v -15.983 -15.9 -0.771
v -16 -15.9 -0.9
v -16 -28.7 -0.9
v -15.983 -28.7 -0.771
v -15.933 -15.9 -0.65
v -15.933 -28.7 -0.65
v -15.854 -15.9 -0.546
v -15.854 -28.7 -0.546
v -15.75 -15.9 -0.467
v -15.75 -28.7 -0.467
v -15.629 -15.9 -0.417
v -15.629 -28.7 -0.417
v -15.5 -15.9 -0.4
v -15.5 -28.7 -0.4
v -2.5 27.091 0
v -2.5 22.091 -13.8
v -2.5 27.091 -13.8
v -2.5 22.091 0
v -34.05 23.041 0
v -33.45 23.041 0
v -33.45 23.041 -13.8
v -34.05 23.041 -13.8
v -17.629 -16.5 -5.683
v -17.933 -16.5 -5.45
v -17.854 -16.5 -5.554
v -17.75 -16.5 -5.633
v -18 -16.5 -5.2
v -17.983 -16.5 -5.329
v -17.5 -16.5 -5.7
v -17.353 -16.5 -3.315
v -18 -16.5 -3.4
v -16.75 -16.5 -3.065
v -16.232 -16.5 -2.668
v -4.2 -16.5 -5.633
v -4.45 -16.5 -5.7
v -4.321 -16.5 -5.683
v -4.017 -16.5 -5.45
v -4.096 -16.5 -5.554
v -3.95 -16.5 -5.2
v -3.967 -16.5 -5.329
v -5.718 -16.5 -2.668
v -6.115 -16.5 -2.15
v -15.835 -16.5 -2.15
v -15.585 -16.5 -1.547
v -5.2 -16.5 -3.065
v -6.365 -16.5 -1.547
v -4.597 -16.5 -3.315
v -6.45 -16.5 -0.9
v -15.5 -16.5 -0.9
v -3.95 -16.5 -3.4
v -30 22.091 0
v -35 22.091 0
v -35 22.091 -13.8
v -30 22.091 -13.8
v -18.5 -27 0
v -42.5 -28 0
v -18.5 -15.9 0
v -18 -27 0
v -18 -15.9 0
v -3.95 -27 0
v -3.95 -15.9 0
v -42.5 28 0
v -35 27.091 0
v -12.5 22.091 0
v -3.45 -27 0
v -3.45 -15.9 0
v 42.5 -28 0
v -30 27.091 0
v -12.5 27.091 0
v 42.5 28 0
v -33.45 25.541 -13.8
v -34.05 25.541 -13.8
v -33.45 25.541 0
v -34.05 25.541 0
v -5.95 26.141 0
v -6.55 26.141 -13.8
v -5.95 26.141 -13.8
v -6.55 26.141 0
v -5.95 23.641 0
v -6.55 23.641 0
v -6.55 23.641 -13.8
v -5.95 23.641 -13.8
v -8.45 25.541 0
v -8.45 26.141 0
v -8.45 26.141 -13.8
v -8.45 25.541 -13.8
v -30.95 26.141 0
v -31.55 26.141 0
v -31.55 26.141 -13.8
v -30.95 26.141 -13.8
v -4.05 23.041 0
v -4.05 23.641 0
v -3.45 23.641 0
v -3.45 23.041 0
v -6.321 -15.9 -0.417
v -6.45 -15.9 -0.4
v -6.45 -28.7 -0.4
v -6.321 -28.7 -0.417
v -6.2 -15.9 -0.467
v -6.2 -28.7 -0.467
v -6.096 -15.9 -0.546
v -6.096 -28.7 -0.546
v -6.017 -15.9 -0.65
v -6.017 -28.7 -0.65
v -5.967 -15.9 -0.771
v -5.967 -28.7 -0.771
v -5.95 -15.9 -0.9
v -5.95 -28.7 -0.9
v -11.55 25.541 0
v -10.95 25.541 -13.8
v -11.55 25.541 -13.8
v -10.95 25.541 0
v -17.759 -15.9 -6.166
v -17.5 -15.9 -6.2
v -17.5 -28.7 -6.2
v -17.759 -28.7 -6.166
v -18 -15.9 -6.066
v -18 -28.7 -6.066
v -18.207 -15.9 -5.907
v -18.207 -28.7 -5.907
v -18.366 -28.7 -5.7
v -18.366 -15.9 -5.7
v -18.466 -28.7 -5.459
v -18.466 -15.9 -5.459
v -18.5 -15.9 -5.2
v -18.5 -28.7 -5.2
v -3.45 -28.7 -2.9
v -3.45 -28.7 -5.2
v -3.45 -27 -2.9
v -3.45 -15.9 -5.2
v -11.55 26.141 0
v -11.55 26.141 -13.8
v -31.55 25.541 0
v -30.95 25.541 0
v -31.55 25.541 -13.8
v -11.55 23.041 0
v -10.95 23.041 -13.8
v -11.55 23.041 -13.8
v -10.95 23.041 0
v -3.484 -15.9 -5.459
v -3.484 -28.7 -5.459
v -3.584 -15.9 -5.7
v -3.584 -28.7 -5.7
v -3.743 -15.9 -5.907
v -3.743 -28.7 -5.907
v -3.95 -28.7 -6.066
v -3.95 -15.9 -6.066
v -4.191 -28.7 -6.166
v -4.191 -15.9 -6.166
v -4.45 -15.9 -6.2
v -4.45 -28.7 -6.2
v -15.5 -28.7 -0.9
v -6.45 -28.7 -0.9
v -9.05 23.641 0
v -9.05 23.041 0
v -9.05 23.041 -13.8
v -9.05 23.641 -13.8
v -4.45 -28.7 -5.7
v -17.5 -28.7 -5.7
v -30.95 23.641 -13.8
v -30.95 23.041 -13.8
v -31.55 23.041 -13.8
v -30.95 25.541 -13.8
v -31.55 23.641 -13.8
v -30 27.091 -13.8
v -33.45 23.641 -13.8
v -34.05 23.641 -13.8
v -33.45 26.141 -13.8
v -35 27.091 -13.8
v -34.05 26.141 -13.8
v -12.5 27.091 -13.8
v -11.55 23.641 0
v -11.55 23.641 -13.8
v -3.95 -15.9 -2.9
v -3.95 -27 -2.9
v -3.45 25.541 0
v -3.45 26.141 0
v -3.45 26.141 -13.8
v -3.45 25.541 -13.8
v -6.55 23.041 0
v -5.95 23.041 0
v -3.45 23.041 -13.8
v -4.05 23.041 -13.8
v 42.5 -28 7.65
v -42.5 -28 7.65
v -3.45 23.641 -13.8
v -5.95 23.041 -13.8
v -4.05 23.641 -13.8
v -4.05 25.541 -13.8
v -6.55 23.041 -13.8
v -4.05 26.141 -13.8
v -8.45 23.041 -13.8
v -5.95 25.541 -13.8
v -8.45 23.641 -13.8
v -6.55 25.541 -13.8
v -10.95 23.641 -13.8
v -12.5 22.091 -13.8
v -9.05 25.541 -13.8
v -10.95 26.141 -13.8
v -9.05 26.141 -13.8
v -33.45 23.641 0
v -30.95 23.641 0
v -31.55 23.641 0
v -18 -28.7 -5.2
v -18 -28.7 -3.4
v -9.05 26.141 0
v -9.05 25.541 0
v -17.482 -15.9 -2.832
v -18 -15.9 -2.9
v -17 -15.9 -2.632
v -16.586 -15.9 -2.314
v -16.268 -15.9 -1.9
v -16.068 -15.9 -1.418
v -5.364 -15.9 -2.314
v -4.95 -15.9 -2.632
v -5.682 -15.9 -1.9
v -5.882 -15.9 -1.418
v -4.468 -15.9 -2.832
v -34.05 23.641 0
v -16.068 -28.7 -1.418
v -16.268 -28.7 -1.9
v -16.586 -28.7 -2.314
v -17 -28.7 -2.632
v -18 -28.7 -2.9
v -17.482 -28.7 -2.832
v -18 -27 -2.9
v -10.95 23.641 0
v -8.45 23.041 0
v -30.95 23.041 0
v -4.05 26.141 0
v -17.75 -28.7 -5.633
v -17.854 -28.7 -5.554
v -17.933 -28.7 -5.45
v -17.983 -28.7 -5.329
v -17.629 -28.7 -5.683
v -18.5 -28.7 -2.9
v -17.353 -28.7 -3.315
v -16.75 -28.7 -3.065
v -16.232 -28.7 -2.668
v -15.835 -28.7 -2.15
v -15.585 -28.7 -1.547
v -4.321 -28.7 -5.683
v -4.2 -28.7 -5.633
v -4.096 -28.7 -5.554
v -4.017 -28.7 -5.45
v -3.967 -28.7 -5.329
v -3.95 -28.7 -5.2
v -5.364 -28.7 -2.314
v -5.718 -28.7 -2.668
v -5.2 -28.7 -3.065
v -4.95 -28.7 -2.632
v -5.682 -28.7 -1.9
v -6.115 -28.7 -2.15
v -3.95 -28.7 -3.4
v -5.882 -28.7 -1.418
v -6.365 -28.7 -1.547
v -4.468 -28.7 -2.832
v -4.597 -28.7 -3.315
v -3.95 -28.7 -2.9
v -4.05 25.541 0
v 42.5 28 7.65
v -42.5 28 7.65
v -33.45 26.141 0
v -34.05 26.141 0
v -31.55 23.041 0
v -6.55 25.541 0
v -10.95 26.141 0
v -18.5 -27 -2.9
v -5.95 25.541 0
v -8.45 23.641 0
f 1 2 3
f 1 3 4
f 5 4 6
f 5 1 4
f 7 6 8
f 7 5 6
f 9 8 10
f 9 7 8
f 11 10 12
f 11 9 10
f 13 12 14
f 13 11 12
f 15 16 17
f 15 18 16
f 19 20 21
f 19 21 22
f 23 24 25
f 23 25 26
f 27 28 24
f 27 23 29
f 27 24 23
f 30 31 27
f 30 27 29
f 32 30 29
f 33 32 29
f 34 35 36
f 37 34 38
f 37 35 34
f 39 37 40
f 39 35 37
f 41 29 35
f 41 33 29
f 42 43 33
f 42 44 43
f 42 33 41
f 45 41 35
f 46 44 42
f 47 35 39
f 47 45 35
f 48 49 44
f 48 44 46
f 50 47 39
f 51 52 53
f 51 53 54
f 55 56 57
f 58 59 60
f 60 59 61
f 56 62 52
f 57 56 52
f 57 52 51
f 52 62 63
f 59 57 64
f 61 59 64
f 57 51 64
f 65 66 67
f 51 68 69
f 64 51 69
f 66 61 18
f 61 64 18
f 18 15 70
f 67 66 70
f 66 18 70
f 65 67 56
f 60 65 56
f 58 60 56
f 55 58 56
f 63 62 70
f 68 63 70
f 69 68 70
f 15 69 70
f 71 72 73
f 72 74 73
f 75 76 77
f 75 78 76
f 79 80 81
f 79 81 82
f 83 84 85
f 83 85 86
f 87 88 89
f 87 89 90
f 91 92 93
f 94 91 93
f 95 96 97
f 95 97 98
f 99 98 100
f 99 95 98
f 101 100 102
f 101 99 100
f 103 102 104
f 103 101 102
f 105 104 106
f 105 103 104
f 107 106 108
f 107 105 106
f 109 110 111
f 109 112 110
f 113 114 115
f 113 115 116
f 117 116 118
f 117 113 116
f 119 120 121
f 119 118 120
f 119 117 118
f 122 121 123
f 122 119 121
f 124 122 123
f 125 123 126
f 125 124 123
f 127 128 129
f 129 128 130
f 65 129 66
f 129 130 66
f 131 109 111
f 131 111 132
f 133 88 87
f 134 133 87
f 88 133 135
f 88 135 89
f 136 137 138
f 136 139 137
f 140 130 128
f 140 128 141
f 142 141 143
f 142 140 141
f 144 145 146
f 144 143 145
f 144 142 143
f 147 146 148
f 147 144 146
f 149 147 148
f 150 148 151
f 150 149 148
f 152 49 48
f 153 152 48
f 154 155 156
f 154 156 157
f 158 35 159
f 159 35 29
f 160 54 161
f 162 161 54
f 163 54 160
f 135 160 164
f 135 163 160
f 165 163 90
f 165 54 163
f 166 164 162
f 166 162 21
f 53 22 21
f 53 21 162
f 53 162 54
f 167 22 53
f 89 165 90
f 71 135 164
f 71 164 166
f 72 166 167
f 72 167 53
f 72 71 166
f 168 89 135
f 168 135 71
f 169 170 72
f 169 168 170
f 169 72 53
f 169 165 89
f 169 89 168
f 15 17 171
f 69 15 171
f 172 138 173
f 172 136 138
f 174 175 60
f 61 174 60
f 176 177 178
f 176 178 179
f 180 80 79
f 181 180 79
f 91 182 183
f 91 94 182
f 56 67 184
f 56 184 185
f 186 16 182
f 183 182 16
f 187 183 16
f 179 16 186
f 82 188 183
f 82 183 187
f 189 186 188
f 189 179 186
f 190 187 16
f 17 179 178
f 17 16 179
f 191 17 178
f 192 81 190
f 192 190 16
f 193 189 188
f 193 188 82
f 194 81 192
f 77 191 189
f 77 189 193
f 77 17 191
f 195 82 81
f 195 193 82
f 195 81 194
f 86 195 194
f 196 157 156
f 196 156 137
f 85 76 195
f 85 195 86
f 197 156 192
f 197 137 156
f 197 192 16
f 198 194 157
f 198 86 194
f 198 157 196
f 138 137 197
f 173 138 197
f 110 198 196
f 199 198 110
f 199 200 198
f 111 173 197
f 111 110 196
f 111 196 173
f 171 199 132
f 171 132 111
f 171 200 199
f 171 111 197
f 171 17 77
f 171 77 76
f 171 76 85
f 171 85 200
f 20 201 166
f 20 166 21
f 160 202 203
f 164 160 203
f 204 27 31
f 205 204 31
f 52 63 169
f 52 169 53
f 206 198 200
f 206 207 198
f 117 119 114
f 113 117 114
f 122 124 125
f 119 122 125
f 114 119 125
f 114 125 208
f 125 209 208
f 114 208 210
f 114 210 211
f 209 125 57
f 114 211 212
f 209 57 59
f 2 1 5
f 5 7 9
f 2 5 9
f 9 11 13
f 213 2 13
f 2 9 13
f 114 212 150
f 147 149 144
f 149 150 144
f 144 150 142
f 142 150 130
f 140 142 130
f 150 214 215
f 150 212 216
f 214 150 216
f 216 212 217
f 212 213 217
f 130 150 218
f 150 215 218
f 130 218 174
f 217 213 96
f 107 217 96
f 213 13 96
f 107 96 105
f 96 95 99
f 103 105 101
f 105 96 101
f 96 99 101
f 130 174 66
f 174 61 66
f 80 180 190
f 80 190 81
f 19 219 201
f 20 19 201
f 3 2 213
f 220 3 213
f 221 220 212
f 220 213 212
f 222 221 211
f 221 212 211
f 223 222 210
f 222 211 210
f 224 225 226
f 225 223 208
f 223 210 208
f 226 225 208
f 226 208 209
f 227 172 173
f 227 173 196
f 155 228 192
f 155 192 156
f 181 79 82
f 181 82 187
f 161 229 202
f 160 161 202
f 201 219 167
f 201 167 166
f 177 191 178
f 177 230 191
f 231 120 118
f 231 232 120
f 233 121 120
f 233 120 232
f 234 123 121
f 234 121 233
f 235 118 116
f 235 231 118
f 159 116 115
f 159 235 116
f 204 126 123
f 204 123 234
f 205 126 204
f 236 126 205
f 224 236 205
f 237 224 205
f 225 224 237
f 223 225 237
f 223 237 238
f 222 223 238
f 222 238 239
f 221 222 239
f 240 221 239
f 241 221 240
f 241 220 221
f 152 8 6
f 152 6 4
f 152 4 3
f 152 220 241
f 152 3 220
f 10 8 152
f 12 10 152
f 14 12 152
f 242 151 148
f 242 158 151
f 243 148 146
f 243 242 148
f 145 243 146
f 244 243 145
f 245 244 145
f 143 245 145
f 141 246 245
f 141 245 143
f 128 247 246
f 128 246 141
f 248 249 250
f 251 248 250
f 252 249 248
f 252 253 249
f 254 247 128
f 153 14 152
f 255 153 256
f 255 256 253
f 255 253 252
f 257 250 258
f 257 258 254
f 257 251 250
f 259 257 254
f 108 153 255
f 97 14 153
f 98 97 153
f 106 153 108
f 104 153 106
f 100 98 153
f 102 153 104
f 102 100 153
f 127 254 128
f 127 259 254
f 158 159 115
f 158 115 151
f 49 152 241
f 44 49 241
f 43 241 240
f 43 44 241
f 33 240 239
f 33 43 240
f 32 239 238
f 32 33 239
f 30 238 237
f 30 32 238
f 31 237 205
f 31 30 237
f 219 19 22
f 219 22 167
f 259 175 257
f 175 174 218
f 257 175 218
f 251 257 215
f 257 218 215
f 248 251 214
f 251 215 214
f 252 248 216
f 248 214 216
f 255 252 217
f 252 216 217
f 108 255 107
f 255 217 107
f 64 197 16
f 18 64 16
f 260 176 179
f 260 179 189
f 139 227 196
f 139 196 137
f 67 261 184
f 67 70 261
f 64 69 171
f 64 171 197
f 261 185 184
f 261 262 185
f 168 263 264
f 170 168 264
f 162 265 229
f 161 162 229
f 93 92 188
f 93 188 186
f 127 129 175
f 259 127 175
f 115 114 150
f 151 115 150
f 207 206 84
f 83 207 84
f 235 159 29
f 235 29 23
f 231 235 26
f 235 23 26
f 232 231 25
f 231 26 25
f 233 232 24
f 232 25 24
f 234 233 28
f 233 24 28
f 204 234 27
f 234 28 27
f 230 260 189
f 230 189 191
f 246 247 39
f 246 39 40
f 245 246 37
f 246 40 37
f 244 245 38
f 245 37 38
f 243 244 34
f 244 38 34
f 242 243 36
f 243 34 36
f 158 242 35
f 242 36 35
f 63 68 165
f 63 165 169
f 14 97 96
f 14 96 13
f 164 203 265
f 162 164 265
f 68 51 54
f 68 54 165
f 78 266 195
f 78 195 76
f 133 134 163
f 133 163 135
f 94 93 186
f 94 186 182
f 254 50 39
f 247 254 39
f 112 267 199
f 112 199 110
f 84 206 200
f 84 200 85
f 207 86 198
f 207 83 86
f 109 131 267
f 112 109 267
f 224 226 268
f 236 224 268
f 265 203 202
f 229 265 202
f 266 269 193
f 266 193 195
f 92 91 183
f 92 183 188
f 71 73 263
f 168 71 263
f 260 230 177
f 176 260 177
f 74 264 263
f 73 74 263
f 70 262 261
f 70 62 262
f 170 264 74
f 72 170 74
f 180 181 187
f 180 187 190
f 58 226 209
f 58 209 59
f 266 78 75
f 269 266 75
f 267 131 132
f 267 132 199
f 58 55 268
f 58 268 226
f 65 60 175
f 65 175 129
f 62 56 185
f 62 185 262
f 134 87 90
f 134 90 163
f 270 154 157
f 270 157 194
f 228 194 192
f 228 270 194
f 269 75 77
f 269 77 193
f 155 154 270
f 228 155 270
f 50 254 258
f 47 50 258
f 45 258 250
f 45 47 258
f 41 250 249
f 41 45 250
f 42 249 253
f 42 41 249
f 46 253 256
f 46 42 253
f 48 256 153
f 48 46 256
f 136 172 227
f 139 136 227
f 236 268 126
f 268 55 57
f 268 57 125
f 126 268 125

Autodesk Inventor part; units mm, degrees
ref_plane "YZ Plane" through (0, 0, 0) normal (1, 0, 0) x (0, 1, 0)
ref_plane "XZ Plane" through (0, 0, 0) normal (0, 1, 0) x (-1, 0, 0)
ref_plane "XY Plane" through (0, 0, 0) normal (0, 0, 1) x (1, 0, 0)
sketch "스케치2" plane through (0, 0, 0) normal (0, 0, 1) x (1, 0, 0)
  line L0 (-42.5, 28) -> (42.5, 28)
  line L1 (42.5, 28) -> (42.5, -28)
  line L2 (42.5, -28) -> (-42.5, -28)
  line L3 (-42.5, -28) -> (-42.5, 28)
  line L4 (-42.5, 28) -> (42.5, -28) construction
  line L5 (42.5, 28) -> (-42.5, -28) construction
  point P0 (0, 0)
  dimension "d6" = 85
  dimension "d7" = 56
extrude "돌출2" add sketch "스케치2" along normal blind 7.65
sketch "스케치4" plane through (0, 0, 0) normal (0, 0, -1) x (-1, 0, 0)
  line L0 (30, 27.091) -> (35, 27.091)
  line L1 (35, 27.091) -> (35, 22.091)
  line L2 (35, 22.091) -> (30, 22.091)
  line L3 (30, 22.091) -> (30, 27.091)
  line L4 (30, 27.091) -> (35, 22.091) construction
  line L5 (35, 27.091) -> (30, 22.091) construction
  line L6 (-42.5, 28) -> (42.5, 28) projected
  line L7 (-42.5, -28) -> (-42.5, 28) projected
  line L8 (30.95, 25.541) -> (31.55, 25.541)
  line L9 (31.55, 25.541) -> (31.55, 26.141)
  line L10 (31.55, 26.141) -> (30.95, 26.141)
  line L11 (30.95, 26.141) -> (30.95, 25.541)
  line L12 (30.95, 25.541) -> (31.55, 26.141) construction
  line L13 (31.55, 25.541) -> (30.95, 26.141) construction
  line L14 (32.5, 24.591) -> (32.5, 25.0687)
  line L15 (32.5, 24.591) -> (32.0223, 24.591)
  line L16 (34.05, 25.541) -> (33.45, 25.541)
  line L17 (33.45, 25.541) -> (33.45, 26.141)
  line L18 (33.45, 26.141) -> (34.05, 26.141)
  line L19 (34.05, 26.141) -> (34.05, 25.541)
  line L20 (34.05, 25.541) -> (33.45, 26.141) construction
  line L21 (33.45, 25.541) -> (34.05, 26.141) construction
  line L22 (30.95, 23.641) -> (31.55, 23.641)
  line L23 (31.55, 23.641) -> (31.55, 23.041)
  line L24 (31.55, 23.041) -> (30.95, 23.041)
  line L25 (30.95, 23.041) -> (30.95, 23.641)
  line L26 (30.95, 23.641) -> (31.55, 23.041) construction
  line L27 (31.55, 23.641) -> (30.95, 23.041) construction
  line L28 (34.05, 23.641) -> (33.45, 23.641)
  line L29 (33.45, 23.641) -> (33.45, 23.041)
  line L30 (33.45, 23.041) -> (34.05, 23.041)
  line L31 (34.05, 23.041) -> (34.05, 23.641)
  line L32 (34.05, 23.641) -> (33.45, 23.041) construction
  line L33 (33.45, 23.641) -> (34.05, 23.041) construction
  line L34 (42.5, 28) -> (42.5, -28) projected
  line L35 (12.5, 22.091) -> (2.5, 22.091)
  line L36 (2.5, 22.091) -> (2.5, 27.091)
  line L37 (2.5, 27.091) -> (12.5, 27.091)
  line L38 (12.5, 27.091) -> (12.5, 22.091)
  line L39 (12.5, 22.091) -> (2.5, 27.091) construction
  line L40 (2.5, 22.091) -> (12.5, 27.091) construction
  line L41 (11.55, 23.641) -> (10.95, 23.641)
  line L42 (10.95, 23.641) -> (10.95, 23.041)
  line L43 (10.95, 23.041) -> (11.55, 23.041)
  line L44 (11.55, 23.041) -> (11.55, 23.641)
  line L45 (11.55, 23.641) -> (10.95, 23.041) construction
  line L46 (10.95, 23.641) -> (11.55, 23.041) construction
  line L47 (11.55, 25.541) -> (11.55, 26.141)
  line L48 (10.95, 26.141) -> (10.95, 25.541)
  line L49 (10.95, 25.541) -> (11.55, 25.541)
  line L50 (11.55, 26.141) -> (10.95, 26.141)
  line L51 (11.55, 26.141) -> (10.95, 25.541) construction
  line L52 (10.95, 26.141) -> (11.55, 25.541) construction
  line L53 (9.05, 23.041) -> (9.05, 23.641)
  line L54 (8.45, 23.641) -> (8.45, 23.041)
  line L55 (8.45, 23.041) -> (9.05, 23.041)
  line L56 (9.05, 23.641) -> (8.45, 23.641)
  line L57 (9.05, 23.641) -> (8.45, 23.041) construction
  line L58 (8.45, 23.641) -> (9.05, 23.041) construction
  line L59 (9.05, 25.541) -> (9.05, 26.141)
  line L60 (8.45, 26.141) -> (8.45, 25.541)
  line L61 (8.45, 25.541) -> (9.05, 25.541)
  line L62 (9.05, 26.141) -> (8.45, 26.141)
  line L63 (9.05, 26.141) -> (8.45, 25.541) construction
  line L64 (8.45, 26.141) -> (9.05, 25.541) construction
  line L65 (6.55, 23.041) -> (6.55, 23.641)
  line L66 (5.95, 23.641) -> (5.95, 23.041)
  line L67 (5.95, 23.041) -> (6.55, 23.041)
  line L68 (6.55, 23.641) -> (5.95, 23.641)
  line L69 (6.55, 23.641) -> (5.95, 23.041) construction
  line L70 (5.95, 23.641) -> (6.55, 23.041) construction
  line L71 (6.55, 25.541) -> (6.55, 26.141)
  line L72 (5.95, 26.141) -> (5.95, 25.541)
  line L73 (5.95, 25.541) -> (6.55, 25.541)
  line L74 (6.55, 26.141) -> (5.95, 26.141)
  line L75 (6.55, 26.141) -> (5.95, 25.541) construction
  line L76 (5.95, 26.141) -> (6.55, 25.541) construction
  line L77 (4.05, 23.041) -> (4.05, 23.641)
  line L78 (3.45, 23.641) -> (3.45, 23.041)
  line L79 (3.45, 23.041) -> (4.05, 23.041)
  line L80 (4.05, 23.641) -> (3.45, 23.641)
  line L81 (4.05, 23.641) -> (3.45, 23.041) construction
  line L82 (3.45, 23.641) -> (4.05, 23.041) construction
  line L83 (4.05, 25.541) -> (4.05, 26.141)
  line L84 (3.45, 26.141) -> (3.45, 25.541)
  line L85 (3.45, 25.541) -> (4.05, 25.541)
  line L86 (4.05, 26.141) -> (3.45, 26.141)
  line L87 (4.05, 26.141) -> (3.45, 25.541) construction
  line L88 (3.45, 26.141) -> (4.05, 25.541) construction
  point P0 (0, 0)
  point P1 (31.25, 25.841)
  point P2 (33.75, 25.841)
  point P3 (31.25, 23.341)
  point P4 (33.75, 23.341)
  point P5 (7.5, 24.591)
  point P6 (11.25, 23.341)
  point P7 (11.25, 25.841)
  point P8 (8.75, 23.341)
  point P9 (8.75, 25.841)
  point P10 (6.25, 23.341)
  point P11 (6.25, 25.841)
  point P12 (3.75, 23.341)
  point P13 (3.75, 25.841)
  dimension "d12" = 5
  dimension "d13" = 5
  dimension "d14" = 0.6
  dimension "d15" = 0.6
  dimension "d18" = 1.25
  dimension "d19" = 7.5
  dimension "d20" = 0.909
  dimension "d21" = 5
  dimension "d22" = 10
  dimension "d23" = 17.5
  dimension "d24" = 0.909
  dimension "d25" = 0.6
  dimension "d26" = 0.6
  dimension "d27" = 1.25
  dimension "d28" = 1.25
  dimension "d31" = 2.5
  dimension "d34" = 2.5
extrude "돌출3" add sketch "스케치4" along normal blind 13.8
sketch "스케치5" plane through (-42.5, -28, 0) normal (0, -1, 0) x (1, 0, 0)
  line L0 (85, 0) -> (0, 0) projected
  line L1 (24, 0) -> (39.15, 0)
  line L2 (39.15, 0) -> (39.15, -6.2)
  line L3 (39.15, -6.2) -> (24, -6.2)
  line L4 (24, -6.2) -> (24, 0)
  line L5 (0, 0) -> (0, 7.65) projected
  line L6 (24, -2.9) -> (24.5, -2.9)
  line L7 (26.5, -0.9) -> (26.5, -0.9)
  line L8 (27, -0.4) -> (36.05, -0.4)
  line L9 (36.55, 0) -> (36.55, -13.8) construction
  line L10 (36.55, -0.9) -> (36.55, -0.9)
  line L11 (38.55, -2.9) -> (39.05, -2.9)
  line L12 (39.05, 0) -> (39.05, -13.8) projected
  arc A0 (24.5, -2.9) -> (26.5, -0.9) centre (24.5, -0.9) ccw
  arc A1 (36.55, -0.9) -> (38.55, -2.9) centre (38.55, -0.9) ccw
  arc A2 (27, -0.4) -> (26.5, -0.9) centre (27, -0.9) ccw
  arc A3 (36.55, -0.9) -> (36.05, -0.4) centre (36.05, -0.9) ccw
  line L13 (24.5, -2.9) -> (24.5, 0.0781)
  line L14 (38.55, -2.9) -> (38.55, 0)
  point P0 (42.5, 0)
  point P1 (26.5, -2.9)
  point P2 (26.5, -0.4)
  point P3 (36.55, -2.9)
  point P4 (36.55, -0.9)
  point P5 (26.5, -0.9)
  point P6 (24.5, 0)
  point P7 (39.05, -6.2)
  dimension "d37" = 24
  dimension "d38" = 15.15
  dimension "d39" = 6.2
  dimension "d40" = 2.5
  dimension "d41" = 2.5
  dimension "d42" = 3.3
  dimension "d43" = 2.5
  dimension "d44" = 2
  dimension "d45" = 0.5
extrude "돌출4" add sketch "스케치5" against normal blind 12.1 contours L12 L11 L14 L0 | L12 L3 L4 L6 A0 A2 L8 A3 A1 L11 | L13 L6 L4 L0
fillet "모깎기1" radius 1 2 edges at (-18.5, -21.95, -6.2) (-3.45, -21.95, -6.2)
extrude "돌출5" cut sketch "스케치5" against normal blind 1 contours L12 L11 L14 L0 | L13 L6 L4 L0
sketch "스케치6" plane through (-15.5, -28, -0.4) normal (0, -1, 0) x (1, 0, 0)
  line L0 (12.05, -2.5) -> (11.55, -2.5) projected
  arc A0 (9.55, -0.5) -> (11.55, -2.5) centre (11.55, -0.5) ccw projected
  arc A1 (9.55, -0.5) -> (9.05, 0) centre (9.05, -0.5) ccw projected
  line L1 (9.05, 0) -> (0, 0) projected
  arc A2 (0, 0) -> (-0.5, -0.5) centre (0, -0.5) ccw projected
  arc A3 (-2.5, -2.5) -> (-0.5, -0.5) centre (-2.5, -0.5) ccw projected
  line L2 (-2.5, -2.5) -> (-3, -2.5) projected
  line L3 (-3, -2.5) -> (-3, -4.8) projected
  arc A4 (-3, -4.8) -> (-2, -5.8) centre (-2, -4.8) ccw projected
  line L4 (-2, -5.8) -> (11.05, -5.8) projected
  arc A5 (11.05, -5.8) -> (12.05, -4.8) centre (11.05, -4.8) ccw projected
  line L5 (12.05, -4.8) -> (12.05, -2.5) projected
  line L6 (-2.5, -4.8) -> (-2.5, -3)
  line L7 (-2.5, -3) -> (-2.5, -3)
  arc A6 (-2.5, -3) -> (0, -0.5) centre (-2.5, -0.5) ccw
  line L8 (0, -0.5) -> (9.05, -0.5)
  arc A7 (9.05, -0.5) -> (11.55, -3) centre (11.55, -0.5) ccw
  line L9 (11.55, -3) -> (11.55, -3)
  line L10 (11.55, -3) -> (11.55, -4.8)
  arc A8 (11.05, -5.3) -> (11.55, -4.8) centre (11.05, -4.8) ccw
  line L11 (11.05, -5.3) -> (-2, -5.3)
  arc A9 (-2.5, -4.8) -> (-2, -5.3) centre (-2, -4.8) ccw
  point P0 (15.5, 0.4)
  point P1 (11.55, -3)
  point P2 (9.05, -0.5)
  point P3 (0, -0.5)
  point P4 (-2.5, -3)
  dimension "d51" = 0.5
extrude "돌출6" cut sketch "스케치6" against normal blind 11.5 contours L6 A6 L8 A7 L10 A8 L11 A9
sketch "스케치7" plane through (-15.5, -28, -0.4) normal (0, -1, 0) x (1, 0, 0)
  arc A0 (9.05, -0.5) -> (11.55, -3) centre (11.55, -0.5) ccw projected
  line L0 (11.55, -3) -> (11.55, -4.8) projected
  arc A1 (11.05, -5.3) -> (11.55, -4.8) centre (11.05, -4.8) ccw projected
  line L1 (11.05, -5.3) -> (-2, -5.3) projected
  arc A2 (-2.5, -4.8) -> (-2, -5.3) centre (-2, -4.8) ccw projected
  line L2 (-2.5, -4.8) -> (-2.5, -3) projected
  arc A3 (-2.5, -3) -> (0, -0.5) centre (-2.5, -0.5) ccw projected
  line L3 (0, -0.5) -> (9.05, -0.5) projected
  line L4 (12.05, -2.5) -> (11.55, -2.5) projected
  arc A4 (9.55, -0.5) -> (11.55, -2.5) centre (11.55, -0.5) ccw projected
  arc A5 (9.55, -0.5) -> (9.05, 0) centre (9.05, -0.5) ccw projected
  line L5 (9.05, 0) -> (0, 0) projected
  arc A6 (0, 0) -> (-0.5, -0.5) centre (0, -0.5) ccw projected
  arc A7 (-2.5, -2.5) -> (-0.5, -0.5) centre (-2.5, -0.5) ccw projected
  line L6 (-2.5, -2.5) -> (-3, -2.5) projected
  line L7 (-3, -2.5) -> (-3, -4.8) projected
  arc A8 (-3, -4.8) -> (-2, -5.8) centre (-2, -4.8) ccw projected
  line L8 (-2, -5.8) -> (11.05, -5.8) projected
  arc A9 (11.05, -5.8) -> (12.05, -4.8) centre (11.05, -4.8) ccw projected
  line L9 (12.05, -4.8) -> (12.05, -2.5) projected
  point P0 (15.5, 0.4)
extrude "돌출7" add sketch "스케치7" along normal blind 0.7
sketch "스케치9" plane through (0, 0, 7.65) normal (0, 0, 1) x (1, 0, 0)
  line L0 (-42.5753, 28.643) -> (43.0741, 28.643) construction
  line L1 (43.0741, 28.643) -> (43.0741, -28.4566) construction
  line L2 (43.0741, -28.4566) -> (-42.5753, -28.4566) construction
  line L3 (-42.5753, -28.4566) -> (-42.5753, 28.643) construction
properties part number "lcd 디스플레이"
